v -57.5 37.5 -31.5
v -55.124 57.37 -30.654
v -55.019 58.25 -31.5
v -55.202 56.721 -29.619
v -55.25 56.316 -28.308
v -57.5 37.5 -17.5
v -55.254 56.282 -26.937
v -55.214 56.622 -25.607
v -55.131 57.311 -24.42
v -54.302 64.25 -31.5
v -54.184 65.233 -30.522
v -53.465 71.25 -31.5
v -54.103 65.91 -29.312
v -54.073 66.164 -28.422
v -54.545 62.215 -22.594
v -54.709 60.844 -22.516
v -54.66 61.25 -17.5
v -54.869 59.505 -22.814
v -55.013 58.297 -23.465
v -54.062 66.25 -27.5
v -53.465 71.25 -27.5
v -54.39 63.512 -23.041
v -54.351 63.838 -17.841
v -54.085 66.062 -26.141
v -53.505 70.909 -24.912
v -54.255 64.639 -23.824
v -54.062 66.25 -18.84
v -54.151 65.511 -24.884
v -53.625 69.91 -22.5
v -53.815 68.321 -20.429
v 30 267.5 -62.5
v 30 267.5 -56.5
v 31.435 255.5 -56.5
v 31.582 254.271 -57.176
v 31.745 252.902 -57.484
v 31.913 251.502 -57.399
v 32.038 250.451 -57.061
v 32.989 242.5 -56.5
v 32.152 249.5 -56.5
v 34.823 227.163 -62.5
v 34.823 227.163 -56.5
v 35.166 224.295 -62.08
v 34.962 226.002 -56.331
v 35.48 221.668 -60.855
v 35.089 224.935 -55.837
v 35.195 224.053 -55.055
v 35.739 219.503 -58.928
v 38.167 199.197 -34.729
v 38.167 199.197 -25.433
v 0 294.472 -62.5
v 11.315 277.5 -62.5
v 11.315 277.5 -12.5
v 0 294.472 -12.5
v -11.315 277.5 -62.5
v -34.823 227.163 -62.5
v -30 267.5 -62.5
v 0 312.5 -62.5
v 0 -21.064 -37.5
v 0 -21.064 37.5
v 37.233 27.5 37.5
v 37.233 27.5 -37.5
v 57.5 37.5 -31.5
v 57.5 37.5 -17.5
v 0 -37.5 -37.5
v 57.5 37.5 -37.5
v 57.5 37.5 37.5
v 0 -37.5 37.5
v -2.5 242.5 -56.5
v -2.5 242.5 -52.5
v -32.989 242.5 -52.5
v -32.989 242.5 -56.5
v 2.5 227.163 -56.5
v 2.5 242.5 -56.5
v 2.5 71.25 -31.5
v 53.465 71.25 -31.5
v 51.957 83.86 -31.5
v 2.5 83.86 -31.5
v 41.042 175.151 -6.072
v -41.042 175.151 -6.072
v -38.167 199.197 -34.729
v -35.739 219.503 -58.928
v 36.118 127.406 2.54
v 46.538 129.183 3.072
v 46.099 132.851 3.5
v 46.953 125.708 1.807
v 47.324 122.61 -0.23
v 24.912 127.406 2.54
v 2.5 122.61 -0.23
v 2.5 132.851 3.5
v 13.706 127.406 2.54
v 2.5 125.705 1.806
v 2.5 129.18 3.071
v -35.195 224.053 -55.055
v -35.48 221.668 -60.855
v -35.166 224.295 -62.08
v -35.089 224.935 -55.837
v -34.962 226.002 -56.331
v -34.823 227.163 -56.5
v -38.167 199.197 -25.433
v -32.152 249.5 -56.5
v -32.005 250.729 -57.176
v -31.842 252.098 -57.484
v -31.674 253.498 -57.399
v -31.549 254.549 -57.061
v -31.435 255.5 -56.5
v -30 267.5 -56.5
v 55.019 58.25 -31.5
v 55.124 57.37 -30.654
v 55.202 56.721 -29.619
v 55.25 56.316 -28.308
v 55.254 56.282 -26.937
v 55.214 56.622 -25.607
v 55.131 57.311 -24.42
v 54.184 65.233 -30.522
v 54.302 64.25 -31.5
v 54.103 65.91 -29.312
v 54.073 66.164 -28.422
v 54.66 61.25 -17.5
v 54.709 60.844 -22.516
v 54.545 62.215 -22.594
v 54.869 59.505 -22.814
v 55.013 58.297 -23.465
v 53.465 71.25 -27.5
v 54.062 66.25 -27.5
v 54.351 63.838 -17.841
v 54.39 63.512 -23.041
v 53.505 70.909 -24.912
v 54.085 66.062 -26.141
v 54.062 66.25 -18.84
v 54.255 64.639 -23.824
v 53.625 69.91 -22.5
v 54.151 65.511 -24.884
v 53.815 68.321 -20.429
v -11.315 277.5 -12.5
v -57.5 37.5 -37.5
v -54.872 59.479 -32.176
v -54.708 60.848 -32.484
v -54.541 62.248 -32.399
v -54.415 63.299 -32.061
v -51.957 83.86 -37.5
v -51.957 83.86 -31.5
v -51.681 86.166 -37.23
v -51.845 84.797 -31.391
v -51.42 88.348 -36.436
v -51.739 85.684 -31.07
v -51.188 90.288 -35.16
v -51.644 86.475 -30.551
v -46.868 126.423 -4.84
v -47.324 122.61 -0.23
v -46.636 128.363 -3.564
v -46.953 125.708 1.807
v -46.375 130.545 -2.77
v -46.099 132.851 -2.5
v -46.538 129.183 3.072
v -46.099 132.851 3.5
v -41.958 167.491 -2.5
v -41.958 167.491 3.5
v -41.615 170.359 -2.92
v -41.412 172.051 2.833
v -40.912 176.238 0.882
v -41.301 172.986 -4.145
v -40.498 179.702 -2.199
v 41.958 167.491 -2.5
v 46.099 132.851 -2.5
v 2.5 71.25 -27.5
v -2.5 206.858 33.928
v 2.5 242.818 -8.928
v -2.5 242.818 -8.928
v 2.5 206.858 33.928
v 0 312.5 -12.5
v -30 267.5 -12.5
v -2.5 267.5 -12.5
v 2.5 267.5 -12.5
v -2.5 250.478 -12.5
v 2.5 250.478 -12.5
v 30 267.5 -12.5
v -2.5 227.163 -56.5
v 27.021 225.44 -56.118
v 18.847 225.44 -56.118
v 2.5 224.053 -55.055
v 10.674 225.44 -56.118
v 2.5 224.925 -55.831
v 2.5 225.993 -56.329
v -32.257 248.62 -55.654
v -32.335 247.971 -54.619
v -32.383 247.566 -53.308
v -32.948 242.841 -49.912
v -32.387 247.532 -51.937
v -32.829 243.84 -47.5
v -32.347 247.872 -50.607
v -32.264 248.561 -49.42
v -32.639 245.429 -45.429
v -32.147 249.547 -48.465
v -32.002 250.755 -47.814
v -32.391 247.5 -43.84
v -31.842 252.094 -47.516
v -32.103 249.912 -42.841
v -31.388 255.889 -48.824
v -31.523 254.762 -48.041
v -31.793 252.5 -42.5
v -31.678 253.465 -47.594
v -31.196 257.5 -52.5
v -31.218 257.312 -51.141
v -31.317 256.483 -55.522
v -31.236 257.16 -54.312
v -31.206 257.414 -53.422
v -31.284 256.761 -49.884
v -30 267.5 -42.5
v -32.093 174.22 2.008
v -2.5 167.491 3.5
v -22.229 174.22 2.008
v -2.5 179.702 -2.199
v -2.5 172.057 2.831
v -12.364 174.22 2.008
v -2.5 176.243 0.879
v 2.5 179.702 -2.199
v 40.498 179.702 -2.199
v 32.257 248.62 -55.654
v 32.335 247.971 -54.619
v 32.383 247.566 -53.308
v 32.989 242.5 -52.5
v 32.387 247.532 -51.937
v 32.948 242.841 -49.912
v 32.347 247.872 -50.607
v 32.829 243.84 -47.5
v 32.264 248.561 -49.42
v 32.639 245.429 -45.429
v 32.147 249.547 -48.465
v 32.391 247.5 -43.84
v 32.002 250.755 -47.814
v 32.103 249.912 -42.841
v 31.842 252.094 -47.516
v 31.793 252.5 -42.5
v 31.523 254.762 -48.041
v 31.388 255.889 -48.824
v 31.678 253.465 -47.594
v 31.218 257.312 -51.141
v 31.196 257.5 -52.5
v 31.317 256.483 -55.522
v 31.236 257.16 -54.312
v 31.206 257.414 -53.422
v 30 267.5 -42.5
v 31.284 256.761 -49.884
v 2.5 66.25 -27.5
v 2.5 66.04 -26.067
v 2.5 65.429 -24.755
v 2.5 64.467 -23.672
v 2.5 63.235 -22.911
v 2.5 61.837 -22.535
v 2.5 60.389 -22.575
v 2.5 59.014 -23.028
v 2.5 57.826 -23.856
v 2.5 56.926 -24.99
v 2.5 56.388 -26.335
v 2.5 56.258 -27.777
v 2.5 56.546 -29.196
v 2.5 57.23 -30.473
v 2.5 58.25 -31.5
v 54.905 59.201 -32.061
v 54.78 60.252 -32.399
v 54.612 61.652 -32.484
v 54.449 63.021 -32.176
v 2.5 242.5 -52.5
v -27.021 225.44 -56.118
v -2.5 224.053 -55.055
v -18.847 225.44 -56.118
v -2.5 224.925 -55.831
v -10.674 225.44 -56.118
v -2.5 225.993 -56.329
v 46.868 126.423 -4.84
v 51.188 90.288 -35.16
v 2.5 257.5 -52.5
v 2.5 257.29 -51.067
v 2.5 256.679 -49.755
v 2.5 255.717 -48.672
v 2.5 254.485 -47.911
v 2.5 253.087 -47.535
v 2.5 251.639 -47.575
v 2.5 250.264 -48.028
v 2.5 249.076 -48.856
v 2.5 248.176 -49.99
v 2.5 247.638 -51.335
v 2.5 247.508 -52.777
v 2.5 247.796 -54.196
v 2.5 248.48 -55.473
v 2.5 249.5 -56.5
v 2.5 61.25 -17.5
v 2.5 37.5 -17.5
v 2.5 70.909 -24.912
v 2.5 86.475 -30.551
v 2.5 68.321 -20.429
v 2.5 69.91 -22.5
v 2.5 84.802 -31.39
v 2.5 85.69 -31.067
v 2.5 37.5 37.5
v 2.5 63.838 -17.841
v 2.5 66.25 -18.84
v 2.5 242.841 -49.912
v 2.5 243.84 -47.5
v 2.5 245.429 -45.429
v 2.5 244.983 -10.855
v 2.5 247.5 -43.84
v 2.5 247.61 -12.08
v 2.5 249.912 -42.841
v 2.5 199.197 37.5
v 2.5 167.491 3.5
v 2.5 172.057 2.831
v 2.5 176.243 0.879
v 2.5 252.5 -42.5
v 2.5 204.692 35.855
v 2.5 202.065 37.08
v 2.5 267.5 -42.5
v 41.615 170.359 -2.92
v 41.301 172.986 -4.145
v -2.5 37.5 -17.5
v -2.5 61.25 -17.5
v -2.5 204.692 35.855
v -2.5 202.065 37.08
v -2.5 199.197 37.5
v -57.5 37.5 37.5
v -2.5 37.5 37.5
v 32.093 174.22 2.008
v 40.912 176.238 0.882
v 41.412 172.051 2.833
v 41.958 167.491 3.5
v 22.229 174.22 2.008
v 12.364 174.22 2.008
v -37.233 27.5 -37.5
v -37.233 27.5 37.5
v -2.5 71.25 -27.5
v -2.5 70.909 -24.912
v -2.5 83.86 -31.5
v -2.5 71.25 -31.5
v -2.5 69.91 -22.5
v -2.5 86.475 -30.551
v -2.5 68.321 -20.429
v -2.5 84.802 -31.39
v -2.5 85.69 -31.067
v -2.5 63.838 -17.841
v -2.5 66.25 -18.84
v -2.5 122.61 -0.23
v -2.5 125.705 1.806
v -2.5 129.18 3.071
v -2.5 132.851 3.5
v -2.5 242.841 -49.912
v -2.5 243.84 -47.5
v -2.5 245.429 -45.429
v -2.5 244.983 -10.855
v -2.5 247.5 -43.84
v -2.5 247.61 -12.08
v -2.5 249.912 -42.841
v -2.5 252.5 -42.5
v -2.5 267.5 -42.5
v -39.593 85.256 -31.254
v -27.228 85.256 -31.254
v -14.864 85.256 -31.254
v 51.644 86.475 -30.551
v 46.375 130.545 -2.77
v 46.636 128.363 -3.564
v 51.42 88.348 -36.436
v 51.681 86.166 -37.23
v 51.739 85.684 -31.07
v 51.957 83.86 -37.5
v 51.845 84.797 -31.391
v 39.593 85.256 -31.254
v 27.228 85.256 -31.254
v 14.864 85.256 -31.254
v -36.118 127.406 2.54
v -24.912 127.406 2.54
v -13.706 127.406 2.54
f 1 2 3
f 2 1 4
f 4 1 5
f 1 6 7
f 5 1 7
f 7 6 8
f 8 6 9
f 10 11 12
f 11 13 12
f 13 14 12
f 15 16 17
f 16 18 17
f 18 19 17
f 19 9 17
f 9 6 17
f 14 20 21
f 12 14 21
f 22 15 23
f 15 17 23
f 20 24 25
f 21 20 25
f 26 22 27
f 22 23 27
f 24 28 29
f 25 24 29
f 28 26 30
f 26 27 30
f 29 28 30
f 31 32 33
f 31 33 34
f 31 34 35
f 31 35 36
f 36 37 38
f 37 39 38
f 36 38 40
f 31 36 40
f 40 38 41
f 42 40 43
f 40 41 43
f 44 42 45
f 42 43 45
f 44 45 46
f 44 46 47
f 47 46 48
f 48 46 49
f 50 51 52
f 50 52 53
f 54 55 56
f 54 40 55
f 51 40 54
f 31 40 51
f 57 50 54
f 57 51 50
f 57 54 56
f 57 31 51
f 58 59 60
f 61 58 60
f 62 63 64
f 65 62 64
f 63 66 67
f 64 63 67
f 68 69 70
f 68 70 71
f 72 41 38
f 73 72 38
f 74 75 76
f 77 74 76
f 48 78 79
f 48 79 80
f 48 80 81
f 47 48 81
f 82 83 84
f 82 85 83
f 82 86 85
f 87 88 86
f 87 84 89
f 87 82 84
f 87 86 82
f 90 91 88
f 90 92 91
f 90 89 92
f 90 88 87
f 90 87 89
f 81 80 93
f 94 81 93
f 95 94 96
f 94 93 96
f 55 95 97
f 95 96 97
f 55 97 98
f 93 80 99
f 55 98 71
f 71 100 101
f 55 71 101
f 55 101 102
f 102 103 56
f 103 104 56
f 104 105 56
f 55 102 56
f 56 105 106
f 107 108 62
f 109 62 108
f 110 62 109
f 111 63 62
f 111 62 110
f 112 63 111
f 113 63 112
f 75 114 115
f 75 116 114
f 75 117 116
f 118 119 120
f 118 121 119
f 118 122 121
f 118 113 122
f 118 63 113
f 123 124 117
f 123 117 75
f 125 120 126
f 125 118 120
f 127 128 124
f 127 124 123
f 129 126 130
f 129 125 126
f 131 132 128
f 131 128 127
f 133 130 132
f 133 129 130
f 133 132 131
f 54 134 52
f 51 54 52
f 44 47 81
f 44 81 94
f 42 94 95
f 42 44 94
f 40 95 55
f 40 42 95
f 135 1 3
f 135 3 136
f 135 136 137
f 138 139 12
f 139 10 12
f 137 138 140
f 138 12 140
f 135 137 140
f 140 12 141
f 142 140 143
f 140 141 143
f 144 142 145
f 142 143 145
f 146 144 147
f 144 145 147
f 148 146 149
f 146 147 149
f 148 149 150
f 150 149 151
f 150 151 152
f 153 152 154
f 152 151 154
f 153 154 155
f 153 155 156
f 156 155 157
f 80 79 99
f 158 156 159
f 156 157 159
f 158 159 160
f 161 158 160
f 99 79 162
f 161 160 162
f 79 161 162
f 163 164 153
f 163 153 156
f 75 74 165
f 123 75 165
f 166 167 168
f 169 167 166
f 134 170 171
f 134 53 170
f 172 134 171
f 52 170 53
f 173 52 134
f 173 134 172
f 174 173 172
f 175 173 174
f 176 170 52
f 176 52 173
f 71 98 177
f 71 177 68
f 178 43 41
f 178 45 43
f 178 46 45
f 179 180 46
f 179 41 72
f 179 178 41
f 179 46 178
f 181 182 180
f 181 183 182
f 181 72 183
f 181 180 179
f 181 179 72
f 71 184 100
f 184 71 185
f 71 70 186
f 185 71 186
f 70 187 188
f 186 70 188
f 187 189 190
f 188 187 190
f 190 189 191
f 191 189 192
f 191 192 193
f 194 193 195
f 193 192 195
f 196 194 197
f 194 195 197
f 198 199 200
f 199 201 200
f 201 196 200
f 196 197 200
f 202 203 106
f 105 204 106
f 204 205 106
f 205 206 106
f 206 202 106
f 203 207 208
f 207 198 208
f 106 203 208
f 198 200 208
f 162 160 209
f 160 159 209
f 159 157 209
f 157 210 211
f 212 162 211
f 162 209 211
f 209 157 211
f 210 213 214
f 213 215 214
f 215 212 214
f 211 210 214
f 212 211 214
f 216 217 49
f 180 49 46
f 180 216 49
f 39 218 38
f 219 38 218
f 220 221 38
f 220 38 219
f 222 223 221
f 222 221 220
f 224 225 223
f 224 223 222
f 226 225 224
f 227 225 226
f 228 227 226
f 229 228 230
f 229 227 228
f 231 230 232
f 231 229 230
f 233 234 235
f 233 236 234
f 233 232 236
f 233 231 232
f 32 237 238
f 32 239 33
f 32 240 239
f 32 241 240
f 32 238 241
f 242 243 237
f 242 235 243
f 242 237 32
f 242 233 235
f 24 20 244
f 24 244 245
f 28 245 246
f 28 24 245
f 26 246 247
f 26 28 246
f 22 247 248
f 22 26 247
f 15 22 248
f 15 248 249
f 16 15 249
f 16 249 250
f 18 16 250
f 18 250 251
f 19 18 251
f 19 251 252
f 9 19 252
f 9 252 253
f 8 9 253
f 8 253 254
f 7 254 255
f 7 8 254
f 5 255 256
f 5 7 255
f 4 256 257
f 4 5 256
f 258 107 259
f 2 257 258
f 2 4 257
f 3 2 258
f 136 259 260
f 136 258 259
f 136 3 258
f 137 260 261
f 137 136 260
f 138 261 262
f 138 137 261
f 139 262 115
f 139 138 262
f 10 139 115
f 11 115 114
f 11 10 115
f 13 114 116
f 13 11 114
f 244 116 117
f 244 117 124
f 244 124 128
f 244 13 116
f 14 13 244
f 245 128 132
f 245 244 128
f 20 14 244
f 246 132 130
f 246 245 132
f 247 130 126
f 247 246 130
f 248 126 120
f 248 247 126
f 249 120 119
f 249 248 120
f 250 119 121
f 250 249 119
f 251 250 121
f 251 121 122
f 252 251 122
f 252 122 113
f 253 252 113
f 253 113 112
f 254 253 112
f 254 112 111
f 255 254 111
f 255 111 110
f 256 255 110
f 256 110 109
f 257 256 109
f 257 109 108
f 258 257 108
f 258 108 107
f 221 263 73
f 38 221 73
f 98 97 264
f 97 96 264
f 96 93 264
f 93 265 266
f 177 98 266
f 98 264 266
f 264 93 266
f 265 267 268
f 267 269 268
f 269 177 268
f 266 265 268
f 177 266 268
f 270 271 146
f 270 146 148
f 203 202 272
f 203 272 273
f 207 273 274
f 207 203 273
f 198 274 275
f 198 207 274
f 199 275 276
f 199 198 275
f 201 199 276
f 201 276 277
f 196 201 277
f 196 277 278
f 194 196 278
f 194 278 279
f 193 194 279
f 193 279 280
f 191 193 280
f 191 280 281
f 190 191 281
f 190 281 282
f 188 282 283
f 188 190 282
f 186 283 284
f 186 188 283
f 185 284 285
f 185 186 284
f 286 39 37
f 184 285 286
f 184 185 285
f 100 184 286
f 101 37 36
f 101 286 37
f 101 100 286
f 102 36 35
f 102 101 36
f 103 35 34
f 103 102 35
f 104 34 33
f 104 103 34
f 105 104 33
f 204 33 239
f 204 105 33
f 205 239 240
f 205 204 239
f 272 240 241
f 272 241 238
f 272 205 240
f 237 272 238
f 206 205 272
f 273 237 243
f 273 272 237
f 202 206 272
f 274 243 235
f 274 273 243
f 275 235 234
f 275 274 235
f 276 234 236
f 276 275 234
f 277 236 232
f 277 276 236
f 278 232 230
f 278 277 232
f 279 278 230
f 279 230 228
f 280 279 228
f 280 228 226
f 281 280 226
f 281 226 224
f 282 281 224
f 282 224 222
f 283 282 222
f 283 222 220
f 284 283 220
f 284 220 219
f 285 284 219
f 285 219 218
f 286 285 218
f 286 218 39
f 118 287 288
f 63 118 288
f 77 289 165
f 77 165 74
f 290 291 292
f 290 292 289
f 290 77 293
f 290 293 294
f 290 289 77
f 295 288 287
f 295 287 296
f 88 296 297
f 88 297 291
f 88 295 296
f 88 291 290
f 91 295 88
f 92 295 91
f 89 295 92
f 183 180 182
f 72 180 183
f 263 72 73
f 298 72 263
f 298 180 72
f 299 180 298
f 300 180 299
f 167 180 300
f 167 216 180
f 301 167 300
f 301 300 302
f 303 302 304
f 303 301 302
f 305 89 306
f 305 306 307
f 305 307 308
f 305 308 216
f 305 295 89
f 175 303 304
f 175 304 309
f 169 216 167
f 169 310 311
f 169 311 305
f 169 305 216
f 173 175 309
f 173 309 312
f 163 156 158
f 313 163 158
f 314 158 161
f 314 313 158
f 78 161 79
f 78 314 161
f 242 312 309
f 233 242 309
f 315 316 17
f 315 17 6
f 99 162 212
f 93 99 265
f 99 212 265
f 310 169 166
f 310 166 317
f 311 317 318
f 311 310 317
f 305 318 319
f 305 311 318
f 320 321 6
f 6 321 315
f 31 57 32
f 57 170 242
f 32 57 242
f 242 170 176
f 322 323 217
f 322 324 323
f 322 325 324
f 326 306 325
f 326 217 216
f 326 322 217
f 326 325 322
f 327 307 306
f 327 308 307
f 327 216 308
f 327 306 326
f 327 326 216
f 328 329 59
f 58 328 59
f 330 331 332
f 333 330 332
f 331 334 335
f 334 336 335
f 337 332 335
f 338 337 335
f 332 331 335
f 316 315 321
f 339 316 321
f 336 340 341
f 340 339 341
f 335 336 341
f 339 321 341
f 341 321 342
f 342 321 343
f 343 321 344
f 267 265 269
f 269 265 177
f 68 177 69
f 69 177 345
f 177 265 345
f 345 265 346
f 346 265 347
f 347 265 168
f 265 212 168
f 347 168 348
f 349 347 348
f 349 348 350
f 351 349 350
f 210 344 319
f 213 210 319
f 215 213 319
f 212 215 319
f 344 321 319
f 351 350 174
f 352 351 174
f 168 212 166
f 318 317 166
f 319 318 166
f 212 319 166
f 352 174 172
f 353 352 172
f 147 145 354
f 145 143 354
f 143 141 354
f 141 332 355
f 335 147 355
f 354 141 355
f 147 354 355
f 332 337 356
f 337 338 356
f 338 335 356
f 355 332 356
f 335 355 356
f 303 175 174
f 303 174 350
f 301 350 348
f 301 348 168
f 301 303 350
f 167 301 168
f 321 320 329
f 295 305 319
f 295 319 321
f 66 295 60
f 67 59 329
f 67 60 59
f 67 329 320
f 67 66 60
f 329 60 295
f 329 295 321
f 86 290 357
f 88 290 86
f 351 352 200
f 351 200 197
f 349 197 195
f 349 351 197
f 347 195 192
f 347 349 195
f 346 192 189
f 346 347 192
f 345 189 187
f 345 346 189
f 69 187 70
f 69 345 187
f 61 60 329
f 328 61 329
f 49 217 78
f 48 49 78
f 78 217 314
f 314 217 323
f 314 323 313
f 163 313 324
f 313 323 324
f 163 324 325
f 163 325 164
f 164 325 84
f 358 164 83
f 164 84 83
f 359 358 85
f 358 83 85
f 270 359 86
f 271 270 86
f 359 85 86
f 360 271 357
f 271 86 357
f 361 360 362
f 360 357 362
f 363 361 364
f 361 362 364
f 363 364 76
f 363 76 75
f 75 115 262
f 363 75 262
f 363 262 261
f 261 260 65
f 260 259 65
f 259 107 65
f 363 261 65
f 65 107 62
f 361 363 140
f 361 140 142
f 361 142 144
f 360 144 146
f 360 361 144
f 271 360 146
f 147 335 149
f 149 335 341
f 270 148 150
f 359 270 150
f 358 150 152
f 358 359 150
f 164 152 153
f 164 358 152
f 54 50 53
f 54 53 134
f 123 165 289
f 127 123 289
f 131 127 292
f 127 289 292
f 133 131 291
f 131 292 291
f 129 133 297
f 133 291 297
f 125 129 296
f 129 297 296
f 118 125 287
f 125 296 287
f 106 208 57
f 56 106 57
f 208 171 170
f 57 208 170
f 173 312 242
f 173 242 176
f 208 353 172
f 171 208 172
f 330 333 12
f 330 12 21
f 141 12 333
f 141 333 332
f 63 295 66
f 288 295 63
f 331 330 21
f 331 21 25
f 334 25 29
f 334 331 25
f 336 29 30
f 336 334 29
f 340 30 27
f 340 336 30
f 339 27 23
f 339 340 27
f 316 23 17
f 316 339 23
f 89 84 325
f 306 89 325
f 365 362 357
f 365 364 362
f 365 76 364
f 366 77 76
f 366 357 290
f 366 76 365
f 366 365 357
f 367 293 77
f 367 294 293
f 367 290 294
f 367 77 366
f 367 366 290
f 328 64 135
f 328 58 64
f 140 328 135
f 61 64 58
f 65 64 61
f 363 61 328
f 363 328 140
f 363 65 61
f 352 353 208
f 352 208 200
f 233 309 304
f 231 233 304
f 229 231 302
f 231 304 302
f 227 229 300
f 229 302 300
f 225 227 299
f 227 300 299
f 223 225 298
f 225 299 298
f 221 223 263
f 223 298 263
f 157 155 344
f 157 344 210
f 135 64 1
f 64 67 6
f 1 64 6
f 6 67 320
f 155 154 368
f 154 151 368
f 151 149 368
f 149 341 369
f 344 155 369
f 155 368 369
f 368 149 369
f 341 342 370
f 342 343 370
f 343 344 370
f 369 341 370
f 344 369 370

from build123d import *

# Parameters (mm, degrees)
BOSS_EXTRUDE1_DEPTH             = 57.5
CUT_EXTRUDE1_DEPTH              = 334.110342079
CUT_EXTRUDE4_START              = 2.5
CUT_EXTRUDE4_DEPTH              = 322.334448445
BOSS_EXTRUDE2_REACH             = 325.834
SKETCH9_R                       = 5
BOSS_EXTRUDE2_DIRECTION_2_REACH = 325.834
CUT_EXTRUDE5_DEPTH              = 324.834448483
CUT_EXTRUDE5_DEPTH_BACK         = 324.834448483
SKETCH9_3_R                     = 5


with BuildPart() as part:
    # Sketch3 → Boss-Extrude1 (new, symmetric)
    with BuildSketch(Plane.YZ):
        with BuildLine():
            Line((242.818015058, -8.927876097), (206.857769199, 33.927876097))
            ThreePointArc((206.857769199, 33.927876097), (203.423507385, 36.56307787), (199.197324767, 37.5))
            Line((199.197324767, 37.5), (-37.5, 37.5))
            Line((-37.5, 37.5), (-37.5, -37.5))
            Line((-37.5, -37.5), (83.860297657, -37.5))
            ThreePointArc((83.860297657, -37.5), (87.280499091, -36.896926208), (90.288173754, -35.160444431))
            Line((90.288173754, -35.160444431), (126.423201987, -4.839555569))
            ThreePointArc((126.423201987, -4.839555569), (129.43087665, -3.103073792), (132.851078083, -2.5))
            Line((132.851078083, -2.5), (167.490945548, -2.5))
            ThreePointArc((167.490945548, -2.5), (171.717128165, -3.43692213), (175.151389979, -6.072123903))
            Line((175.151389979, -6.072123903), (219.50263215, -58.927876097))
            ThreePointArc((219.50263215, -58.927876097), (222.936893964, -61.56307787), (227.163076582, -62.5))
            Line((227.163076582, -62.5), (312.5, -62.5))
            Line((312.5, -62.5), (312.5, -12.5))
            Line((312.5, -12.5), (250.478459489, -12.5))
            ThreePointArc((250.478459489, -12.5), (246.252276872, -11.56307787), (242.818015058, -8.927876097))
        make_face()
    extrude(amount=BOSS_EXTRUDE1_DEPTH, both=True)

    # Sketch4 → Cut-Extrude1 (cut, through all)
    with BuildSketch(Plane.XY.offset(37.5)):
        Polygon((57.5, 312.5), (0, 312.5), (30, 267.5), (57.5, 37.5), align=None)
        Polygon((-30, 267.5), (0, 312.5), (-57.5, 312.5), (-57.5, 37.5), align=None)
        Polygon((11.314829082, 277.5), (0, 294.472243623), (-11.314829082, 277.5), align=None)
        Polygon((0, -37.5), (-57.5, 37.5), (-57.5, -37.5), align=None)
        Polygon((57.5, -37.5), (57.5, 37.5), (0, -37.5), align=None)
        Polygon((-37.232627886, 27.5), (0, -21.064297242), (37.232627886, 27.5), align=None)
    extrude(amount=-CUT_EXTRUDE1_DEPTH, mode=Mode.SUBTRACT)

    # Sketch7 → Cut-Extrude4 (cut, through all)
    with BuildSketch(Plane.YZ.offset(CUT_EXTRUDE4_START)):
        with BuildLine():
            Line((37.5, 37.5), (37.5, -31.5))
            Line((37.5, -31.5), (83.860297657, -31.5))
            add(Edge.make_bspline(
                [(83.860297657, -31.5), (84.097540548, -31.5), (84.57337446, -31.458390238), (85.263019182, -31.273484118), (85.908338575, -30.972374338), (86.294621244, -30.70182834), (86.474686107, -30.55073598)],
                knots=[-1.570796327, -1.570796327, -1.570796327, -1.570796327, -1.396263402, -1.221730476, -1.047197551, -0.872664626, -0.872664626, -0.872664626, -0.872664626], degree=3))
            Line((86.474686107, -30.55073598), (122.609714339, -0.229847118))
            add(Edge.make_bspline(
                [(122.609714339, -0.229847118), (123.320382845, 0.366474563), (124.848442038, 1.436524541), (127.37869722, 2.615963904), (130.072824203, 3.338033288), (131.926306613, 3.5), (132.851078083, 3.5)],
                knots=[1.570796327, 1.570796327, 1.570796327, 1.570796327, 1.745329252, 1.919862177, 2.094395102, 2.268928028, 2.268928028, 2.268928028, 2.268928028], degree=3))
            Line((132.851078083, 3.5), (167.490945548, 3.5))
            add(Edge.make_bspline(
                [(167.490945548, 3.5), (168.646100732, 3.5), (170.964100646, 3.246604285), (174.273089477, 2.122910497), (177.265048317, 0.308445679), (178.955852245, -1.310444394), (179.701732038, -2.199349317)],
                knots=[0.698131701, 0.698131701, 0.698131701, 0.698131701, 0.916297857, 1.134464014, 1.35263017, 1.570796327, 1.570796327, 1.570796327, 1.570796327], degree=3))
            Line((179.701732038, -2.199349317), (224.052974209, -55.055101511))
            add(Edge.make_bspline(
                [(224.052974209, -55.055101511), (224.24085811, -55.279012825), (224.665398004, -55.685610911), (225.425771497, -56.147439629), (226.271617671, -56.434873066), (226.866794678, -56.5), (227.163076582, -56.5)],
                knots=[-2.443460953, -2.443460953, -2.443460953, -2.443460953, -2.225294796, -2.00712864, -1.788962483, -1.570796327, -1.570796327, -1.570796327, -1.570796327], degree=3))
            Line((227.163076582, -56.5), (267.5, -56.5))
            Line((267.5, -56.5), (267.5, -12.5))
            Line((267.5, -12.5), (250.478459489, -12.5))
            ThreePointArc((250.478459489, -12.5), (246.252276872, -11.56307787), (242.818015058, -8.927876097))
            Line((242.818015058, -8.927876097), (206.857769199, 33.927876097))
            ThreePointArc((206.857769199, 33.927876097), (203.423507385, 36.56307787), (199.197324767, 37.5))
            Line((199.197324767, 37.5), (37.5, 37.5))
        make_face()
    cut_extrude4 = extrude(amount=CUT_EXTRUDE4_DEPTH, mode=Mode.SUBTRACT)

    # Mirror1: Cut-Extrude4 across plane
    add(cut_extrude4.mirror(Plane(origin=(0, 0, 0), x_dir=(0, 0, 1), z_dir=(1, 0, 0))), mode=Mode.SUBTRACT)

    # Boss-Extrude2: up to this plane
    boss_extrude2_end = Plane(origin=(61.110075713, 7.306639487, -62.5), z_dir=(0.9929278168066742, 0.11871963027036327, 0))
    # Sketch9 → Boss-Extrude2 (add, up to the surface)
    with BuildSketch(Plane.YZ, mode=Mode.PRIVATE) as boss_extrude2_sk1:
        with BuildLine():
            Line((61.25, -17.5), (37.5, -17.5))
            Line((37.5, -17.5), (37.5, -37.5))
            Line((37.5, -37.5), (71.25, -37.5))
            Line((71.25, -37.5), (71.25, -27.5))
            ThreePointArc((71.25, -27.5), (68.321067812, -20.428932188), (61.25, -17.5))
        make_face()
        with Locations((61.25, -27.5)):
            Circle(SKETCH9_R, mode=Mode.SUBTRACT)
    boss_extrude2_tool1 = split(extrude(boss_extrude2_sk1.sketch, amount=BOSS_EXTRUDE2_REACH, mode=Mode.PRIVATE), bisect_by=boss_extrude2_end, keep=Keep.BOTH, mode=Mode.PRIVATE)
    add(boss_extrude2_tool1.solids().sort_by_distance((0, 52.889493, -27.789855))[0])
    # Sketch9 → Boss-Extrude2 (add, up to the surface)
    with BuildSketch(Plane.YZ, mode=Mode.PRIVATE) as boss_extrude2_sk2:
        with BuildLine():
            Line((267.5, -62.5), (267.5, -42.5))
            Line((267.5, -42.5), (252.5, -42.5))
            ThreePointArc((252.5, -42.5), (245.428932188, -45.428932188), (242.5, -52.5))
            Line((242.5, -52.5), (242.5, -62.5))
            Line((242.5, -62.5), (267.5, -62.5))
        make_face()
        with Locations((252.5, -52.5)):
            Circle(SKETCH9_R, mode=Mode.SUBTRACT)
    boss_extrude2_tool2 = split(extrude(boss_extrude2_sk2.sketch, amount=BOSS_EXTRUDE2_REACH, mode=Mode.PRIVATE), bisect_by=boss_extrude2_end, keep=Keep.BOTH, mode=Mode.PRIVATE)
    add(boss_extrude2_tool2.solids().sort_by_distance((0, 267.179844, -52.5))[0])

    # Boss-Extrude2 direction 2: up to this plane
    boss_extrude2_direction_2_end = Plane(origin=(-61.110075713, 7.306639487, -62.5), z_dir=(0.9929278168066742, -0.11871963027036327, 0))
    # Sketch9 → Boss-Extrude2 direction 2 (add, up to the surface)
    with BuildSketch(Plane.YZ, mode=Mode.PRIVATE) as boss_extrude2_direction_2_sk1:
        with BuildLine():
            Line((61.25, -17.5), (37.5, -17.5))
            Line((37.5, -17.5), (37.5, -37.5))
            Line((37.5, -37.5), (71.25, -37.5))
            Line((71.25, -37.5), (71.25, -27.5))
            ThreePointArc((71.25, -27.5), (68.321067812, -20.428932188), (61.25, -17.5))
        make_face()
        with Locations((61.25, -27.5)):
            Circle(SKETCH9_R, mode=Mode.SUBTRACT)
    boss_extrude2_direction_2_tool1 = split(extrude(boss_extrude2_direction_2_sk1.sketch, amount=-BOSS_EXTRUDE2_DIRECTION_2_REACH, mode=Mode.PRIVATE), bisect_by=boss_extrude2_direction_2_end, keep=Keep.BOTH, mode=Mode.PRIVATE)
    add(boss_extrude2_direction_2_tool1.solids().sort_by_distance((0, 52.889493, -27.789855))[0])
    # Sketch9 → Boss-Extrude2 direction 2 (add, up to the surface)
    with BuildSketch(Plane.YZ, mode=Mode.PRIVATE) as boss_extrude2_direction_2_sk2:
        with BuildLine():
            Line((267.5, -62.5), (267.5, -42.5))
            Line((267.5, -42.5), (252.5, -42.5))
            ThreePointArc((252.5, -42.5), (245.428932188, -45.428932188), (242.5, -52.5))
            Line((242.5, -52.5), (242.5, -62.5))
            Line((242.5, -62.5), (267.5, -62.5))
        make_face()
        with Locations((252.5, -52.5)):
            Circle(SKETCH9_R, mode=Mode.SUBTRACT)
    boss_extrude2_direction_2_tool2 = split(extrude(boss_extrude2_direction_2_sk2.sketch, amount=-BOSS_EXTRUDE2_DIRECTION_2_REACH, mode=Mode.PRIVATE), bisect_by=boss_extrude2_direction_2_end, keep=Keep.BOTH, mode=Mode.PRIVATE)
    add(boss_extrude2_direction_2_tool2.solids().sort_by_distance((0, 267.179844, -52.5))[0])

    # Sketch9<3> → Cut-Extrude5 (cut, two sides: drawn at the far end of the back side and taken through both)
    with BuildSketch(Plane.YZ.offset(-CUT_EXTRUDE5_DEPTH_BACK)):
        with Locations((61.25, -27.5)):
            Circle(SKETCH9_3_R)
        with Locations((252.5, -52.5)):
            Circle(SKETCH9_3_R)
    extrude(amount=CUT_EXTRUDE5_DEPTH + CUT_EXTRUDE5_DEPTH_BACK, mode=Mode.SUBTRACT)


solid = part.part
